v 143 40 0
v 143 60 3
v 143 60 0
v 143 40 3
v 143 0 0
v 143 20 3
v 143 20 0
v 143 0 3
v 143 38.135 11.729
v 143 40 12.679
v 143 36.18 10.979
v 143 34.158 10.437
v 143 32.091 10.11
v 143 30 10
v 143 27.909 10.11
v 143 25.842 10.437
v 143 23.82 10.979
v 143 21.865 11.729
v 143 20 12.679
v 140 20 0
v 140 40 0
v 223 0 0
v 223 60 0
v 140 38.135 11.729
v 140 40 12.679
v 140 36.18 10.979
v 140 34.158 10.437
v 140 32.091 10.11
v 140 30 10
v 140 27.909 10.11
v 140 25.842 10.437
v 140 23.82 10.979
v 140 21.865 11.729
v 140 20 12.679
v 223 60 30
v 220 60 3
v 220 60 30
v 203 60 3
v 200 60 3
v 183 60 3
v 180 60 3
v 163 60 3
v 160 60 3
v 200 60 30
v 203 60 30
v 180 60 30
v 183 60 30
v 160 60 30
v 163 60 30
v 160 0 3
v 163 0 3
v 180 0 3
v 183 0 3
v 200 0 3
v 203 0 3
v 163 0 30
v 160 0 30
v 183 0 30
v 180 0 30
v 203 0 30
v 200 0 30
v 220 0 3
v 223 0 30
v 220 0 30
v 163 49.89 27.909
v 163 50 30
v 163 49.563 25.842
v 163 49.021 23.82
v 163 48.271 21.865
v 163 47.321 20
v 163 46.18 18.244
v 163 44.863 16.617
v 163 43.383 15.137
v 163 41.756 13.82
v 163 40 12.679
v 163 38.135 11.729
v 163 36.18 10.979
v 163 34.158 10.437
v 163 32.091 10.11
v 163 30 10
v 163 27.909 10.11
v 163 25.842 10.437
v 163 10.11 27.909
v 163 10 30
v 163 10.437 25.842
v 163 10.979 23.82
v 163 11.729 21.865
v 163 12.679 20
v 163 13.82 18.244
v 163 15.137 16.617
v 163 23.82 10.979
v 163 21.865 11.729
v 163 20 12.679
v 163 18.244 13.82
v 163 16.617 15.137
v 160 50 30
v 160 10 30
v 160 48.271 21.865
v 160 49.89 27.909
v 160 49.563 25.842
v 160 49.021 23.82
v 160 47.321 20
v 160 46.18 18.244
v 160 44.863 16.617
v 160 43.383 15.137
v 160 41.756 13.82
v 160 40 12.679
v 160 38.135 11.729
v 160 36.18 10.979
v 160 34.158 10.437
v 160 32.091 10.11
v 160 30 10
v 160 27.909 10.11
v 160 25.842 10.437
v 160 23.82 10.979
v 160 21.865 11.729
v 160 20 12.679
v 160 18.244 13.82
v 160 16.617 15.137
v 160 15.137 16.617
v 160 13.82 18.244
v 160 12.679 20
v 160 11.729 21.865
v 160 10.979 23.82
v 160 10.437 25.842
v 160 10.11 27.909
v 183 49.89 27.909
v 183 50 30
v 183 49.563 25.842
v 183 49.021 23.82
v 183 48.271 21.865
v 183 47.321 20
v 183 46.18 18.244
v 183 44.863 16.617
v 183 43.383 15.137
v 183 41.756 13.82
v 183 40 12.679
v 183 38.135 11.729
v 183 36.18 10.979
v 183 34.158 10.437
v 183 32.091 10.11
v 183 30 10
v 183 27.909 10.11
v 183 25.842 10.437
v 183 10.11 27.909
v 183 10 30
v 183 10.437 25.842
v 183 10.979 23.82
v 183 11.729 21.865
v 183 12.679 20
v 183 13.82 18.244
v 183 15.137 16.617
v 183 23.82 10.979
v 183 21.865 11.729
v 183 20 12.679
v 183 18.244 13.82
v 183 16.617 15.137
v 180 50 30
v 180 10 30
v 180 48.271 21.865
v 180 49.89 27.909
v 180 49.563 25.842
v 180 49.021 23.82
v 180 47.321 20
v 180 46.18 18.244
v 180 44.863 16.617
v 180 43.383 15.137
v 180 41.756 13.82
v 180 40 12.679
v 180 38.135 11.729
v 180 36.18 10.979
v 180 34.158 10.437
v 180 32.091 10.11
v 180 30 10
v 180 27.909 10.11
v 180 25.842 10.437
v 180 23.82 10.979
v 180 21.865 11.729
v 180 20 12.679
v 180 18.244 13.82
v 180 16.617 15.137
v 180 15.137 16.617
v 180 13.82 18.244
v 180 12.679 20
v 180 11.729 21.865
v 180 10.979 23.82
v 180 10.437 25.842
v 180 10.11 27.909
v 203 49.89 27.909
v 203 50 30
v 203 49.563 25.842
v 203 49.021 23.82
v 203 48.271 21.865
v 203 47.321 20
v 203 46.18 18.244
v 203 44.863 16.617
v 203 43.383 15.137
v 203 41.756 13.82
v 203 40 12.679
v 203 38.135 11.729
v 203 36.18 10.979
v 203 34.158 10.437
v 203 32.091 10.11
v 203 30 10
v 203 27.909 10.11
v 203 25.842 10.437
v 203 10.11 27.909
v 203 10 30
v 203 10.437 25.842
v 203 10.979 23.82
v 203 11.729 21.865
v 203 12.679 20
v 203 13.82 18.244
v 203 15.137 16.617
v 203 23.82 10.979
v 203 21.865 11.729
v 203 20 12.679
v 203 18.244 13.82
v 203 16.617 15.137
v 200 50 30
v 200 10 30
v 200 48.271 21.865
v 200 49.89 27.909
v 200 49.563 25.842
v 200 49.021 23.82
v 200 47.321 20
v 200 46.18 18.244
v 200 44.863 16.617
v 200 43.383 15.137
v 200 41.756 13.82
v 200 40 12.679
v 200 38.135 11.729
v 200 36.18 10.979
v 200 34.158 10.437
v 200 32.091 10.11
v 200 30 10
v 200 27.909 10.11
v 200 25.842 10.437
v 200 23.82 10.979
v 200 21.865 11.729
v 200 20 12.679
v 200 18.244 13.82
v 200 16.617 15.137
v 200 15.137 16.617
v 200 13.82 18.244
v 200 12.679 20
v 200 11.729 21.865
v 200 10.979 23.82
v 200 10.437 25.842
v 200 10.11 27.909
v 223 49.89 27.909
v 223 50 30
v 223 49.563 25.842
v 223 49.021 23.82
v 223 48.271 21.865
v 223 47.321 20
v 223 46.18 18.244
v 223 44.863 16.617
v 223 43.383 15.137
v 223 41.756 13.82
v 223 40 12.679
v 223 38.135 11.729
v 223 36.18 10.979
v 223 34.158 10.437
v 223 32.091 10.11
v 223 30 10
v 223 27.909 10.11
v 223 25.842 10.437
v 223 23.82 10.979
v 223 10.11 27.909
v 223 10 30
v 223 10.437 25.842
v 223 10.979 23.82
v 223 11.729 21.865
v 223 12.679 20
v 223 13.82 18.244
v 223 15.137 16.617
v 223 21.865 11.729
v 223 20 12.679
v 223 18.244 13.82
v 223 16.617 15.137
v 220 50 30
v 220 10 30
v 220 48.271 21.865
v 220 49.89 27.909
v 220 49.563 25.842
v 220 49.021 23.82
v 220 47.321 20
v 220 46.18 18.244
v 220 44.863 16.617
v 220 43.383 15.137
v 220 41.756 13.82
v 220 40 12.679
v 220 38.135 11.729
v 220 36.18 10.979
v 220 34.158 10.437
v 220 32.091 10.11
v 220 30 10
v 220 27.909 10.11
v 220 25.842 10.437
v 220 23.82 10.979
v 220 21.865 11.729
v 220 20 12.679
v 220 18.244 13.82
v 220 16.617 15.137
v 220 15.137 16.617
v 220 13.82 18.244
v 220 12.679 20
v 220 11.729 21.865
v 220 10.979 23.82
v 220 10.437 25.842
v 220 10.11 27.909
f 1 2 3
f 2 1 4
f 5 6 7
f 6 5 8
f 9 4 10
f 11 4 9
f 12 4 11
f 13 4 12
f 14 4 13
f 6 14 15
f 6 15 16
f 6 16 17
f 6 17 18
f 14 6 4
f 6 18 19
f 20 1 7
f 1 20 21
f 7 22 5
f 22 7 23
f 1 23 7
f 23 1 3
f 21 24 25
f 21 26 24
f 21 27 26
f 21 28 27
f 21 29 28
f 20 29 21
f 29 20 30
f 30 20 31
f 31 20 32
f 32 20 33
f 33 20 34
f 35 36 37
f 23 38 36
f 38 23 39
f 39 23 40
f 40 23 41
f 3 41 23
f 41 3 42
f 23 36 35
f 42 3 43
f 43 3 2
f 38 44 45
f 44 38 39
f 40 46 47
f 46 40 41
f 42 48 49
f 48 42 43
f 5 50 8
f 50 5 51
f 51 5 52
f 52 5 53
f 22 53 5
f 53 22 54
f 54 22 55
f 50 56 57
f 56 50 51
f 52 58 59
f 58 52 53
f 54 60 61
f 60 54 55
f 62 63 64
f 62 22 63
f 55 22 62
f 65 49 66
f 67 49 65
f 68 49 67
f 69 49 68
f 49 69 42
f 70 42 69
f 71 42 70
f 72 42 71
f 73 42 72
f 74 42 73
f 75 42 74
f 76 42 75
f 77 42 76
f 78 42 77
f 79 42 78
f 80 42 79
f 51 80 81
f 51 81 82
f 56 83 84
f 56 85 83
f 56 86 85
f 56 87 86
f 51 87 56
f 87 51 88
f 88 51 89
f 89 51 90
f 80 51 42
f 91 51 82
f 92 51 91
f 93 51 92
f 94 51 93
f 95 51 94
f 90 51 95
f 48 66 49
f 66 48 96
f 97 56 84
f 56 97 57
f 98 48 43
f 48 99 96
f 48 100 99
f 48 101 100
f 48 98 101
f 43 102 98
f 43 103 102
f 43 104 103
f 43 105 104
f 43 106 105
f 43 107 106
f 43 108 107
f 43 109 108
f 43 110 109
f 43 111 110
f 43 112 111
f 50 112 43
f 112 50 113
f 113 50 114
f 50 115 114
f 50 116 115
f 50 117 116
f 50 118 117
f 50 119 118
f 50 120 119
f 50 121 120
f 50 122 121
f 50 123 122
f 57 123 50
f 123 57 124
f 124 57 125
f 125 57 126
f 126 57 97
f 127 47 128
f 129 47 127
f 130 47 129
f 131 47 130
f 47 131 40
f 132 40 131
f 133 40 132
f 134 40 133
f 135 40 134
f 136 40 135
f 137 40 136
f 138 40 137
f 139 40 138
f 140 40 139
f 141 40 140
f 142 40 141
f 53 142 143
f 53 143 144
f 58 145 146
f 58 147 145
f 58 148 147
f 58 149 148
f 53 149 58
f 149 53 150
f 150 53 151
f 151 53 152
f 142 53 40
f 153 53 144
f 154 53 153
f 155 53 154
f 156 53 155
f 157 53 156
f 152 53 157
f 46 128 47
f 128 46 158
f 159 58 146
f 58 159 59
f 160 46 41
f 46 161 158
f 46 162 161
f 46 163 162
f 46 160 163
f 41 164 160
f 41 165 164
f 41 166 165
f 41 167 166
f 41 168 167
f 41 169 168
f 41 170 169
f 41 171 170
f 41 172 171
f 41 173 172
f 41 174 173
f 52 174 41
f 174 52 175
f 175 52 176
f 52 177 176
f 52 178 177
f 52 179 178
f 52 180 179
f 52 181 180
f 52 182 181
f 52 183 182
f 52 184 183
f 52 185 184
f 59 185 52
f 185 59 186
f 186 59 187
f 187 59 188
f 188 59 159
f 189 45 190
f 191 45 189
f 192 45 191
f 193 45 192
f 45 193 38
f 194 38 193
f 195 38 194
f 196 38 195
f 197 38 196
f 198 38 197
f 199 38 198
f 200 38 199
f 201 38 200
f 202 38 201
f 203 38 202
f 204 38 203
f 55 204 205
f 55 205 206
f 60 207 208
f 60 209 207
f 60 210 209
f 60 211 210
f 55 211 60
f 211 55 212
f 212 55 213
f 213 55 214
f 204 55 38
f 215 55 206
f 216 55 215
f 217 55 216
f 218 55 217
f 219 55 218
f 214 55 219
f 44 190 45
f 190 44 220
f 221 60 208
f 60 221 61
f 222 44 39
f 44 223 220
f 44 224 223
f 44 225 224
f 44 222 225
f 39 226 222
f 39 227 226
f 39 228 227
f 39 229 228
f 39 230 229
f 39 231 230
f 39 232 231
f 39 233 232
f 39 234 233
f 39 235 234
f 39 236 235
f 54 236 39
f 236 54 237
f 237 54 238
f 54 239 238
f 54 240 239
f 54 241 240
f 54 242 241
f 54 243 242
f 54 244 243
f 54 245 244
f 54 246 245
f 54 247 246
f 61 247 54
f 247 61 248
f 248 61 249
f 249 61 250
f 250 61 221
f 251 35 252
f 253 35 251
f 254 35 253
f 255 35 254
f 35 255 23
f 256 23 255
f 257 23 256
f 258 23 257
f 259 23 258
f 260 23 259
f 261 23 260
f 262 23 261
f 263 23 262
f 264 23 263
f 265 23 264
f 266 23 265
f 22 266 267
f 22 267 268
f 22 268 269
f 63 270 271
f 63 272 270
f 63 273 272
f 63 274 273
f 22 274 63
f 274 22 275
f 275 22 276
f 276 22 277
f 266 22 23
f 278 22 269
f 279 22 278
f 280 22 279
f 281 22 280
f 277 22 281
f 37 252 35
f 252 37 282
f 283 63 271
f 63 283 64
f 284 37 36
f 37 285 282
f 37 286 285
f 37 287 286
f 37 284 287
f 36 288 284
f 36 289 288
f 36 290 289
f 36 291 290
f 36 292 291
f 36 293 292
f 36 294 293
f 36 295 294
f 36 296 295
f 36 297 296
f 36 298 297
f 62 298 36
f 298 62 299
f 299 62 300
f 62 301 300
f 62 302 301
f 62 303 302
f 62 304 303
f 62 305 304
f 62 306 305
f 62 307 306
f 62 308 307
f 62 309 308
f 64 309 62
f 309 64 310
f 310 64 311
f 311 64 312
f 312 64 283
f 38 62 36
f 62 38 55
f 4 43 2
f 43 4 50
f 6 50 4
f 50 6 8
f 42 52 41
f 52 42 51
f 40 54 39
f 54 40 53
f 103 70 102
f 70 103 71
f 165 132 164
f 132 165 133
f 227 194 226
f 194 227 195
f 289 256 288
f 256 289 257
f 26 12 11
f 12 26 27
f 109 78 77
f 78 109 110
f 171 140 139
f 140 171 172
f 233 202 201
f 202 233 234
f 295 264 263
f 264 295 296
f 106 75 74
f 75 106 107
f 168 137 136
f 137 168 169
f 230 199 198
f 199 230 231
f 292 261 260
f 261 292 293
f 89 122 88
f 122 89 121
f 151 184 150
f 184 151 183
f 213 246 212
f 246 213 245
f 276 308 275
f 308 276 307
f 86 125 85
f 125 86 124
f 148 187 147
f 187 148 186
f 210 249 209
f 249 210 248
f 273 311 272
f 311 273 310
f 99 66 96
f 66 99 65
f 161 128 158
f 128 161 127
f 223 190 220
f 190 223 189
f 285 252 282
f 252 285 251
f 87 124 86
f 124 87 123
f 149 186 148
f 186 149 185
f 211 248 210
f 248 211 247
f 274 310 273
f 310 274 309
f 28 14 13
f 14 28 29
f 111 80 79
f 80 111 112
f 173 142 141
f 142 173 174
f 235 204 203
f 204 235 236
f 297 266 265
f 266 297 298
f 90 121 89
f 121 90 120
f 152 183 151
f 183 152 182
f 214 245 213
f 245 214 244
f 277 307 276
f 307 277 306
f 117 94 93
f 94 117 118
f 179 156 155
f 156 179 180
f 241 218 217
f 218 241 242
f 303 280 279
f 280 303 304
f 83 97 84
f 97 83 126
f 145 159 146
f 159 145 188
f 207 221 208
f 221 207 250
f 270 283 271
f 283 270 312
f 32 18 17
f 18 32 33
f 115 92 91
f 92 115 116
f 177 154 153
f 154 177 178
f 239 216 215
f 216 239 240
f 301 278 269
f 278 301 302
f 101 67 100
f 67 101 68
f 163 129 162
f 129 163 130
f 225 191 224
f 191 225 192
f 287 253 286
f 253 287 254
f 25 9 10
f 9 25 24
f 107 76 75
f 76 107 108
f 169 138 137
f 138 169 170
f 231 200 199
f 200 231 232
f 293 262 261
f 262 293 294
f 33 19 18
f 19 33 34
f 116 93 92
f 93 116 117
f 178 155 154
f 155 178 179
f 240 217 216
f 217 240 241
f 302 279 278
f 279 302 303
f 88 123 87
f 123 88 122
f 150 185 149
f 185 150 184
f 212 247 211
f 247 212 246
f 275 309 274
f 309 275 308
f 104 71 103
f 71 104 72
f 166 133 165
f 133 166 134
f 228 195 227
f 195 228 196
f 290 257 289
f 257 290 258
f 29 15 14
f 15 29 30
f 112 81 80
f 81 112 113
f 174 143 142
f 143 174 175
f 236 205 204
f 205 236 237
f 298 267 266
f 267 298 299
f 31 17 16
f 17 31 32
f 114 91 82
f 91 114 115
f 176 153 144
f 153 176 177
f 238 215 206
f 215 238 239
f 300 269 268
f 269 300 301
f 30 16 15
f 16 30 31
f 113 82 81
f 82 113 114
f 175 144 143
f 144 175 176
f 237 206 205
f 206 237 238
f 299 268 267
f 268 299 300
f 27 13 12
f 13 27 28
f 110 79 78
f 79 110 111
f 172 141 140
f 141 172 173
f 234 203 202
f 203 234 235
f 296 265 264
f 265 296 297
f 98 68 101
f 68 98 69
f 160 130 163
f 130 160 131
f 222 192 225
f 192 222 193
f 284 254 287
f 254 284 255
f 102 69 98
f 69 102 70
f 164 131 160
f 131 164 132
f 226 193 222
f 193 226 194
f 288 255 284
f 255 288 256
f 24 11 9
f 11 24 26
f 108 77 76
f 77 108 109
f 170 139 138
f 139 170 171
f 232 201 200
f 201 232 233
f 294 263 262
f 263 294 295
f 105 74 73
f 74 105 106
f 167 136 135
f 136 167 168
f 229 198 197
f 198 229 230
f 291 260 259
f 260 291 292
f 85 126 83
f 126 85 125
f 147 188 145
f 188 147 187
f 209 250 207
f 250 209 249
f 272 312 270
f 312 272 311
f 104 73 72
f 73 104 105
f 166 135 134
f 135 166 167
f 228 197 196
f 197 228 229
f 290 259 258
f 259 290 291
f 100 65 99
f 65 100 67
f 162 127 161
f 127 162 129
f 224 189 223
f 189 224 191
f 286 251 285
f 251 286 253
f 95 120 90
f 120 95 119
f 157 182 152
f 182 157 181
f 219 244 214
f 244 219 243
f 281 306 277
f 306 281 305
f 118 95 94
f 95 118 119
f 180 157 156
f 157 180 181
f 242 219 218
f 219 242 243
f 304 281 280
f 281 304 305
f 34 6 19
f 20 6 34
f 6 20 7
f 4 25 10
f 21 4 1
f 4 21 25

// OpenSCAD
echo(version=version());
$fn=60;

baseH = 3;
baseL = 140;
baseL2 = 80;
baseW = 60;
sepH = 30;
sepM = 20;

*difference() {
	union(){
		// base
		cube([baseL,baseW,baseH]);
		// separater
		for (x = [0 : sepM : baseL])
		{
			translate([x, 0, 0]) sep();
		}
	}
	defcyl();
	translate([baseL, baseW/3 - 0.2, 0]) cube([baseH,baseW/3+0.4 ,sepH]);
}

// translate([10, 0, 0]) 
difference() {
	union(){
		// base2
		translate([baseL, 0, 0]) cube([baseL2,baseW,baseH]);
		// separater2
		for (x = [baseL : sepM : baseL + baseL2])
		{
			translate([x, 0, 0]) sep();
		}
	}
	defcyl();
	translate([baseL, 0, 0]) cube([baseH,baseW/3,sepH]);
	translate([baseL, baseW/3*2, 0]) cube([baseH,baseW/3,sepH]);
}

module sep() {
	cube([baseH,baseW,sepH]);
}

module defcyl(){
	translate([-10, baseW/2, baseW/4 + sepH/2]) rotate([0, 90, 0]) cylinder(h=baseL + baseL2 + 20, r=(baseW/3));
}
